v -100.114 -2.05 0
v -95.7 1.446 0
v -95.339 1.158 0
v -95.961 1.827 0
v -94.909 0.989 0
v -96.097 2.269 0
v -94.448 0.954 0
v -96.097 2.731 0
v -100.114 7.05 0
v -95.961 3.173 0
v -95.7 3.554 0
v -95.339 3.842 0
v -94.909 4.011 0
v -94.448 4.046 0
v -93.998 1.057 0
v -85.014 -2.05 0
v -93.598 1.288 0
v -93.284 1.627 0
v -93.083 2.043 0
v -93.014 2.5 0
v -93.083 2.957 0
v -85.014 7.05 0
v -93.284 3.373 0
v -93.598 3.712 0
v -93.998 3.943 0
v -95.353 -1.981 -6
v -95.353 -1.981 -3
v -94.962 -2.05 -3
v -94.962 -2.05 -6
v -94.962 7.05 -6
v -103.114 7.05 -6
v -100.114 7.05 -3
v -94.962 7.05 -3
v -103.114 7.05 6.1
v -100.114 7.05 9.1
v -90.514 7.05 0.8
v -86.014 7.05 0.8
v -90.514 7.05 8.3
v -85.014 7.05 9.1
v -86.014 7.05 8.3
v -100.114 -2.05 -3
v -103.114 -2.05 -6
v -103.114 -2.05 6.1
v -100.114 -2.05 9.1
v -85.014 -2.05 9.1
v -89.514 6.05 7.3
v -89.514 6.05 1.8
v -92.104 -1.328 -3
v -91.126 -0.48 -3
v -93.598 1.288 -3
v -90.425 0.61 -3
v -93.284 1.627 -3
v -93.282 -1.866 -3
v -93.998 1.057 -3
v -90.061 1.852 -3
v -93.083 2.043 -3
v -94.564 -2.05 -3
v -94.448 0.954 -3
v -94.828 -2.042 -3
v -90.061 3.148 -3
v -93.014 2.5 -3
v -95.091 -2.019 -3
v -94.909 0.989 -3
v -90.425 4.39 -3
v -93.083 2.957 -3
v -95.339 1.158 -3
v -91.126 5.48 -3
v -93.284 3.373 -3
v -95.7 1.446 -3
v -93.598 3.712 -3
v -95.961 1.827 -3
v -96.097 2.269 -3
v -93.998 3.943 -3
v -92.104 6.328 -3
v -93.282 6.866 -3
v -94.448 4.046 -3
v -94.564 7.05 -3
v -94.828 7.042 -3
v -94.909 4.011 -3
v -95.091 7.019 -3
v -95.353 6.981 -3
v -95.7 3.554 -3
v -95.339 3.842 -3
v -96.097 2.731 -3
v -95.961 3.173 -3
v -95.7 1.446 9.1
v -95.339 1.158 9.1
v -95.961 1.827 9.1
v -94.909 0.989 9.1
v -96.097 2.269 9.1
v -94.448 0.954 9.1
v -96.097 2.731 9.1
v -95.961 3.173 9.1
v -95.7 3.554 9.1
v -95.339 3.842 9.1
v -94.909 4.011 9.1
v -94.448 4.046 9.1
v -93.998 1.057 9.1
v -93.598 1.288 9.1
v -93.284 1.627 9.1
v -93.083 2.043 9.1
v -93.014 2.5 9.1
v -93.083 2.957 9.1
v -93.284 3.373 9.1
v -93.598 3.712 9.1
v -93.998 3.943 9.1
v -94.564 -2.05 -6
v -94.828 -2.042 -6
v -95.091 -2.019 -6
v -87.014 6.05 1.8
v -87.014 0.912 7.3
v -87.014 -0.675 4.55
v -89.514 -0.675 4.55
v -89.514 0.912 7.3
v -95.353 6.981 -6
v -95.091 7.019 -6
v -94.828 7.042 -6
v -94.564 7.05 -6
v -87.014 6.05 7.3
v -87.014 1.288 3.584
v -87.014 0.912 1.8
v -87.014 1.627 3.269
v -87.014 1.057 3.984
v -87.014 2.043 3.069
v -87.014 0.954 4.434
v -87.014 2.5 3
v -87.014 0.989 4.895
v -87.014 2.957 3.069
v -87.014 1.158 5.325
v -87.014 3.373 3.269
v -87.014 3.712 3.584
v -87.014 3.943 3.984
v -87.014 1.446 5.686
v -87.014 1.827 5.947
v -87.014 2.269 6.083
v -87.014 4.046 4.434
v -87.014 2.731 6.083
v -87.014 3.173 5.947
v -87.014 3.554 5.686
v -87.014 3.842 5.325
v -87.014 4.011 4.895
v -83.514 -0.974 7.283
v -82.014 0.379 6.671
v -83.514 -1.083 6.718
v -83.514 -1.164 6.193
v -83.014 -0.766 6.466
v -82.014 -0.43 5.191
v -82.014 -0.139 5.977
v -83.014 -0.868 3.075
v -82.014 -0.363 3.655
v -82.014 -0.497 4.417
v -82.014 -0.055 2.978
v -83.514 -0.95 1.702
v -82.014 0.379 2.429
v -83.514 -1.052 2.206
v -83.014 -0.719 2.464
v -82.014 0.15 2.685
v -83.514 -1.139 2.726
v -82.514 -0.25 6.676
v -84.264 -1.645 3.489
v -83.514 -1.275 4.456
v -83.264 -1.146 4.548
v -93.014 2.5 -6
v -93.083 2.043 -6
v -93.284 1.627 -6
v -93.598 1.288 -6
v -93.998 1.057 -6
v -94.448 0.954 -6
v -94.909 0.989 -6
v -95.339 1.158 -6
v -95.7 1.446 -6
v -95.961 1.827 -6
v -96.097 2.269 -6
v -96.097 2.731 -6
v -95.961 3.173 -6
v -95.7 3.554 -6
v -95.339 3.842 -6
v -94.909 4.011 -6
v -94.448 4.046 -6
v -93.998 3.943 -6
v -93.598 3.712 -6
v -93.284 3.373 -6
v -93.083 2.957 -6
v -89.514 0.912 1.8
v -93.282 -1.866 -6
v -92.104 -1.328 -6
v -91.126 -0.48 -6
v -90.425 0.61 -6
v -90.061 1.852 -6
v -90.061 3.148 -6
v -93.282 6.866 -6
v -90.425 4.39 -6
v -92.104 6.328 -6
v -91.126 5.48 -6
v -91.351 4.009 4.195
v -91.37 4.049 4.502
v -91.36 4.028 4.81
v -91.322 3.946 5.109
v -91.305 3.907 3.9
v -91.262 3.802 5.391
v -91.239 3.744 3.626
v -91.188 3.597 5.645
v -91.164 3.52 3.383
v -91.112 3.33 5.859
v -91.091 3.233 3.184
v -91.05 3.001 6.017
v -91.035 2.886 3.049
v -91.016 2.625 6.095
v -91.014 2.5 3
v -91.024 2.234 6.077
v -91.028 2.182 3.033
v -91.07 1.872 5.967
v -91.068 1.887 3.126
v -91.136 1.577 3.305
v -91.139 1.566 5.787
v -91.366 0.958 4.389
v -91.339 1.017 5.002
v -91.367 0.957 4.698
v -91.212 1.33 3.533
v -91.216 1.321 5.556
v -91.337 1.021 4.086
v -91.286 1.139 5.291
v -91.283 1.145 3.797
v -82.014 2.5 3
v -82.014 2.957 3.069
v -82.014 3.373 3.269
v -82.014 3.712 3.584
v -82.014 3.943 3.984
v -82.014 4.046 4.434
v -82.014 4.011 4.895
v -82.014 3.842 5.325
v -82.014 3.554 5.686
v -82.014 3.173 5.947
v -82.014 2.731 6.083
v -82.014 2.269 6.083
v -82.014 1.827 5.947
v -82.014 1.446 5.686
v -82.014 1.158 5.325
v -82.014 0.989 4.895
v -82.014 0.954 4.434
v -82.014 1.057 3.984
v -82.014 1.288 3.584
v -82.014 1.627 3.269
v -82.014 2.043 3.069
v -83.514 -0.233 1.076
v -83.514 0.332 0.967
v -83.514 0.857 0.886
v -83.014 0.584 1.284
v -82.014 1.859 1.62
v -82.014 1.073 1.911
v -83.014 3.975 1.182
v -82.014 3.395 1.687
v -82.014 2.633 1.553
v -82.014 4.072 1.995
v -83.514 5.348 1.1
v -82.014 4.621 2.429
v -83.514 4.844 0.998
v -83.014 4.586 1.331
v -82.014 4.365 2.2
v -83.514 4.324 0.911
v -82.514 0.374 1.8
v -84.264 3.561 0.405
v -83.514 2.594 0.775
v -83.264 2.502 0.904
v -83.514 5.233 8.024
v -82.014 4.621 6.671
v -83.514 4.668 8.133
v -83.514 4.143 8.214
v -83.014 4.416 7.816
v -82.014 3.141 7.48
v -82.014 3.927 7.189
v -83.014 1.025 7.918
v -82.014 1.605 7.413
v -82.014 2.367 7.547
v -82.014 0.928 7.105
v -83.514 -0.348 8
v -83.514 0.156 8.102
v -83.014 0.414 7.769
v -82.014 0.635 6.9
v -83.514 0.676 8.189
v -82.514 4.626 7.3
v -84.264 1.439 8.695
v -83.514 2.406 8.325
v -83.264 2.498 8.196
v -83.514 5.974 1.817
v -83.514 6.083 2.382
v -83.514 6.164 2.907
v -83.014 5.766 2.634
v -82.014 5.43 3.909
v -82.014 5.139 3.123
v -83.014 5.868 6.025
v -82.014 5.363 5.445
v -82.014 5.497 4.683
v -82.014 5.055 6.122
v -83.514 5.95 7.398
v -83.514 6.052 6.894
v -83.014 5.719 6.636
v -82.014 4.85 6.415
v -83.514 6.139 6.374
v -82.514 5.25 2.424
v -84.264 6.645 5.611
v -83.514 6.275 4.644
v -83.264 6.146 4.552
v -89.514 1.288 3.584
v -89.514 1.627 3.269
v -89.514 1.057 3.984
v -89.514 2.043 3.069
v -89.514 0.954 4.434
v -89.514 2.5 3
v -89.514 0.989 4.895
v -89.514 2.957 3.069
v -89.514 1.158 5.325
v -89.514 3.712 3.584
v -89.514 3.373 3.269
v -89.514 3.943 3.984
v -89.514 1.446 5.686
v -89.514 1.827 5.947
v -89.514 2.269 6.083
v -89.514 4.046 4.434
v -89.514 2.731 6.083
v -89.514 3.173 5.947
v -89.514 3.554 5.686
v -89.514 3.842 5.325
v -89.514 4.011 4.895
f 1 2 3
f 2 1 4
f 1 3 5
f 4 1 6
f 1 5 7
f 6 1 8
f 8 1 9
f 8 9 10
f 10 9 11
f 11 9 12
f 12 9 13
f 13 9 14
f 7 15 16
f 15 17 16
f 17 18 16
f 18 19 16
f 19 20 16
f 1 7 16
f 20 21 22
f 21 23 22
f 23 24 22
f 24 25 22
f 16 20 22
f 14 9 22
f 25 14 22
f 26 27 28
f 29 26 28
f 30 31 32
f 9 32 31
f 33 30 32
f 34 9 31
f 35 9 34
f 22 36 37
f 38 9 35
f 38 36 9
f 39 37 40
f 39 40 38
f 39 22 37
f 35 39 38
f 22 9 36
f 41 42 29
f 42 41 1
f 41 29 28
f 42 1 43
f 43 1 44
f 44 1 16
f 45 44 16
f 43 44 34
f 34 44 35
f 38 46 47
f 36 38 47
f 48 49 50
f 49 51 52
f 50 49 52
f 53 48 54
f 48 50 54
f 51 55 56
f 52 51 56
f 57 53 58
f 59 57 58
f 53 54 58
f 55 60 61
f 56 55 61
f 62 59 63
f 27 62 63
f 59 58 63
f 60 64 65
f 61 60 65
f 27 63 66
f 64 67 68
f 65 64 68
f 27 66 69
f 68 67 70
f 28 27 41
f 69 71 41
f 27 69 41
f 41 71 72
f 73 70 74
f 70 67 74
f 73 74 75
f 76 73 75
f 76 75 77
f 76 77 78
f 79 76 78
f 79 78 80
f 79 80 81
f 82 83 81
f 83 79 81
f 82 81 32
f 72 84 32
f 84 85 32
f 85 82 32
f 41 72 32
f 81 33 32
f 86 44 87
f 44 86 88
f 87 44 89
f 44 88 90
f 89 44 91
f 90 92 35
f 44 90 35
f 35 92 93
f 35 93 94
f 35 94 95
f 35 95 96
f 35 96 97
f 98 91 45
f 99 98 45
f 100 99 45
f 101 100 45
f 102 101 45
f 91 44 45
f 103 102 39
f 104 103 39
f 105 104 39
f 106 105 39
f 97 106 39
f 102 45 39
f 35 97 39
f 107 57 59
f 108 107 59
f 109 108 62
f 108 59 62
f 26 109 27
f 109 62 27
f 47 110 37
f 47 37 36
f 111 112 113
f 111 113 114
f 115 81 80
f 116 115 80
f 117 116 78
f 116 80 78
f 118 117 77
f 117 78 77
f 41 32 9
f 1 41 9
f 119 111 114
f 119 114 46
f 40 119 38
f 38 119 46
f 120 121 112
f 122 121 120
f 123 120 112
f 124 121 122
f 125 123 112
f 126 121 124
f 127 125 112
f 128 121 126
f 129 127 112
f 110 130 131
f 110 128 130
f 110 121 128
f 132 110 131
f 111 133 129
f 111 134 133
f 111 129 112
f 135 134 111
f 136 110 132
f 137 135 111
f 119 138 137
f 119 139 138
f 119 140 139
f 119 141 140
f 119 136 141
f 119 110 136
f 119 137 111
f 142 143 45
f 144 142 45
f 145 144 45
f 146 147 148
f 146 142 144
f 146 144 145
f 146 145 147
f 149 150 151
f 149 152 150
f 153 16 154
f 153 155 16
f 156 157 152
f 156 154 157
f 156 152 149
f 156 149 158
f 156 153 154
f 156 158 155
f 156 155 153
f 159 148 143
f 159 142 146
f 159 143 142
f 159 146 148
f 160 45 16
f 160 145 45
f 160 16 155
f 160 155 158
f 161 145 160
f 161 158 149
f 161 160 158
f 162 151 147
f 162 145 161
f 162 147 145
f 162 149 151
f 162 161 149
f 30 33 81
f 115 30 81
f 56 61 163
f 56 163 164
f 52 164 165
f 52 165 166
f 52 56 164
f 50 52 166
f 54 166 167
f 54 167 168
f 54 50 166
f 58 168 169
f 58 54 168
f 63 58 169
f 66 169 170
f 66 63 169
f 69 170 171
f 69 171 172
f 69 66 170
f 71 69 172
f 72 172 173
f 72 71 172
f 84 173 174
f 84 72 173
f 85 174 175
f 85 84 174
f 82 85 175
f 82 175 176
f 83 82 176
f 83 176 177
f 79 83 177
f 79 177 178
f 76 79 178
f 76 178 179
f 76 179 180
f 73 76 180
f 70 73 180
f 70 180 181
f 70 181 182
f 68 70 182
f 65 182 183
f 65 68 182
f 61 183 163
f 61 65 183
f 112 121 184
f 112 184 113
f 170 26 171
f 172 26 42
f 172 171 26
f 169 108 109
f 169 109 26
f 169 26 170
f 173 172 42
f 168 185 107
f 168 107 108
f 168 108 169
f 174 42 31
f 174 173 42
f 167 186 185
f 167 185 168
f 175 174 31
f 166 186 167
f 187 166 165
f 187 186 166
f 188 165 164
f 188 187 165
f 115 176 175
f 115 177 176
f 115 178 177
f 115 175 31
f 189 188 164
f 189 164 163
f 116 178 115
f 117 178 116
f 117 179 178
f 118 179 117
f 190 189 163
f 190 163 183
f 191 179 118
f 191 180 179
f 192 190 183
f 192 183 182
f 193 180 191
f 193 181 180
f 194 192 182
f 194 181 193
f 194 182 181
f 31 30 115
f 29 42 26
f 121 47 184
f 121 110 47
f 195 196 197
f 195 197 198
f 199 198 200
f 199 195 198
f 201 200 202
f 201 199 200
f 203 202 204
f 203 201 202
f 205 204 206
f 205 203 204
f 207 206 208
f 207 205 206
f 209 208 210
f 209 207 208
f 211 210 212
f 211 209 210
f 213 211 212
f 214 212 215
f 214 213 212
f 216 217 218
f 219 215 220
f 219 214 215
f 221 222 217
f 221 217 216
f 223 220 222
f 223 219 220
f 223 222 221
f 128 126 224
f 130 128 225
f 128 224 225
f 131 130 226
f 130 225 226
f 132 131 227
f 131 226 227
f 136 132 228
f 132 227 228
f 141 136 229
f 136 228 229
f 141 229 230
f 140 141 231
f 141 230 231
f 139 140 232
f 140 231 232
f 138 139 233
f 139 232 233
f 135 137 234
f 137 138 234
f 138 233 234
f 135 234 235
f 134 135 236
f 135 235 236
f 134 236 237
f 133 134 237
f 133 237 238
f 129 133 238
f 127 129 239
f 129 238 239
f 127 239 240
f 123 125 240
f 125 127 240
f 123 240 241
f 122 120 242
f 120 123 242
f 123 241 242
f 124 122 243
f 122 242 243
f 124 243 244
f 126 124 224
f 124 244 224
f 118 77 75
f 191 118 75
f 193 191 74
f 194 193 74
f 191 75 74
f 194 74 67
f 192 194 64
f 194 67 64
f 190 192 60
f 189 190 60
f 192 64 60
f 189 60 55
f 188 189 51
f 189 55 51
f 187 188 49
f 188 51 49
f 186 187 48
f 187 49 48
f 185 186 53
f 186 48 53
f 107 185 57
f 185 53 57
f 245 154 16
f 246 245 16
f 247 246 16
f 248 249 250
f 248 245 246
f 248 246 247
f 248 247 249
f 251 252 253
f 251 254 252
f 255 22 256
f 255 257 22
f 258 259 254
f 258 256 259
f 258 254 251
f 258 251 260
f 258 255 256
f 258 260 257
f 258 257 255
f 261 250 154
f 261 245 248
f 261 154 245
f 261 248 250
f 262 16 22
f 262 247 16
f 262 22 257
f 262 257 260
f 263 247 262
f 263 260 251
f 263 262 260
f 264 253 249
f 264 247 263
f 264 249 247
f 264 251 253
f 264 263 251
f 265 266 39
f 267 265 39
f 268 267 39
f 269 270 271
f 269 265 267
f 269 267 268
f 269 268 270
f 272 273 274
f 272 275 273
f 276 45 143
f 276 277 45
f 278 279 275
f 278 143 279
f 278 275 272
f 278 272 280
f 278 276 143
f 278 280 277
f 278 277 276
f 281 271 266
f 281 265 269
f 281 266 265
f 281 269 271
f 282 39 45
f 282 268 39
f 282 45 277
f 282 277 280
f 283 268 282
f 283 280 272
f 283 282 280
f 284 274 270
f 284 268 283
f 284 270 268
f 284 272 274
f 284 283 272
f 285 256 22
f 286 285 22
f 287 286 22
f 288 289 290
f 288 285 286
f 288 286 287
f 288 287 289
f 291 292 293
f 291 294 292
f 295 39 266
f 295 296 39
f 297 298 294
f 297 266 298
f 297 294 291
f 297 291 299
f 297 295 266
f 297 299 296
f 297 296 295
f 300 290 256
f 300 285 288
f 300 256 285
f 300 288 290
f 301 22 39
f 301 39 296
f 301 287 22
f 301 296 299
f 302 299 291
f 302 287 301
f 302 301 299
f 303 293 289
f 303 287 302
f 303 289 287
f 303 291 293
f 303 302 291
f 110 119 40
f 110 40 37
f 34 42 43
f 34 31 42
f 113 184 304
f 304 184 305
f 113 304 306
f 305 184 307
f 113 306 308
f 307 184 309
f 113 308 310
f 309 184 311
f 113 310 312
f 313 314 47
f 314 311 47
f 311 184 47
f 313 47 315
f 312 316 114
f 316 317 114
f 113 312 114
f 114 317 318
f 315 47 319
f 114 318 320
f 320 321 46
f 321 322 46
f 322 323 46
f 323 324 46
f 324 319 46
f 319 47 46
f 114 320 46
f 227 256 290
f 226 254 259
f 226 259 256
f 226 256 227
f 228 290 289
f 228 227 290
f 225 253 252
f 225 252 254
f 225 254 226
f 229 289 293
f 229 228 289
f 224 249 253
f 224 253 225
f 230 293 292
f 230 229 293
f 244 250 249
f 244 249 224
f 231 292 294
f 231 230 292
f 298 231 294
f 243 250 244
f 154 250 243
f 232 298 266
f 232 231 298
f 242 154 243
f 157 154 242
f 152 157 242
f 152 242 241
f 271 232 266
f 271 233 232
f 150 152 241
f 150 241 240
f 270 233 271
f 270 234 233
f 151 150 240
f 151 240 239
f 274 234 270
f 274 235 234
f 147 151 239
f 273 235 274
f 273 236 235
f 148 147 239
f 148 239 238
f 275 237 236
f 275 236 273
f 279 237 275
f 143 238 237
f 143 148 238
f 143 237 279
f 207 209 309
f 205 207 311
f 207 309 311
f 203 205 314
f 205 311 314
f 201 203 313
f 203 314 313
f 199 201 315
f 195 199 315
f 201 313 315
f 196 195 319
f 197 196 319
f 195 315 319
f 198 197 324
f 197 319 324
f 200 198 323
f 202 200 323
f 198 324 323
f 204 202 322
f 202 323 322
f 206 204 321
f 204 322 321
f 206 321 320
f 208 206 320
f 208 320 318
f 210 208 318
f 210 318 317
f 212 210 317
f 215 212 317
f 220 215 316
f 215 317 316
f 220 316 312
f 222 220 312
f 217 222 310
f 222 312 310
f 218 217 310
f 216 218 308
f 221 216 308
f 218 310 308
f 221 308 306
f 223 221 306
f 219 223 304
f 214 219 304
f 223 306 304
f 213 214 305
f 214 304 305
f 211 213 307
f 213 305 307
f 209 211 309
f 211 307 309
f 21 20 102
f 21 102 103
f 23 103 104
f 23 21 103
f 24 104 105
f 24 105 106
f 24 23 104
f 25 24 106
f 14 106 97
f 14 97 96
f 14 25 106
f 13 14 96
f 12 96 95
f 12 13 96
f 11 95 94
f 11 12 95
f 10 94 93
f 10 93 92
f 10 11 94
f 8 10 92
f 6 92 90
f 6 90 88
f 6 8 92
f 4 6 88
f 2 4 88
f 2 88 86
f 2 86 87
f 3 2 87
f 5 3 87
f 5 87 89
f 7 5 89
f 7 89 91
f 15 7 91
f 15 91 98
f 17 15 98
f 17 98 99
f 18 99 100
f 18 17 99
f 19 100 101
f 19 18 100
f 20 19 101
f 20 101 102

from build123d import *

# Parameters (mm, degrees)
SKETCH1_R               = 4.55
SKETCH1_R_2             = 1.55
BOSS_EXTRUDE1_DEPTH     = 9.1
SKETCH2_R               = 1.55
BOSS_EXTRUDE2_DEPTH     = 3
SKETCH3_W               = 15.1
SKETCH3_H               = 9.1
BOSS_EXTRUDE3_DEPTH     = 3
CUT_EXTRUDE1_REACH      = 26.036
CUT_EXTRUDE1_END_RADIUS = 3.55
SKETCH4_R               = 1.55
SKETCH5_R               = 1.55
CUT_EXTRUDE2_DEPTH      = 2.5
CHAMFER1_SIZE           = 1
CHAMFER2_SIZE           = 3


with BuildPart() as part:
    # Sketch1 → Boss-Extrude1 (new body)
    # profile 1 of 3: a face of its own
    with BuildSketch(Plane.XY):
        with Locations((-94.564189657, 2.5)):
            Circle(SKETCH1_R)
        with Locations((-94.564189657, 2.5)):
            Circle(SKETCH1_R_2, mode=Mode.SUBTRACT)
    # profile 2 of 3: a face of its own
    with BuildSketch(Plane.XY):
        with BuildLine():
            ThreePointArc((-94.564189657, -2.05), (-99.114189657, 2.5), (-94.564189657, 7.05))
            Line((-94.564189657, 7.05), (-100.114189657, 7.05))
            Line((-100.114189657, 7.05), (-100.114189657, -2.05))
            Line((-100.114189657, -2.05), (-94.564189657, -2.05))
        make_face()
    # profile 3 of 3: a face of its own
    with BuildSketch(Plane.XY):
        with BuildLine():
            Line((-85.014189657, 7.05), (-94.564189657, 7.05))
            ThreePointArc((-94.564189657, 7.05), (-91.346853802, 5.717335854), (-90.014189657, 2.5))
            ThreePointArc((-90.014189657, 2.5), (-91.346853802, -0.717335854), (-94.564189657, -2.05))
            Line((-94.564189657, -2.05), (-85.014189657, -2.05))
            Line((-85.014189657, -2.05), (-85.014189657, 7.05))
        make_face()
    extrude(amount=BOSS_EXTRUDE1_DEPTH)



with BuildPart() as body_2:
    # Sketch2 → Boss-Extrude2 (new body)
    # profile 1 of 2: a face of its own
    with BuildSketch(Plane(origin=(0, 0, -3), x_dir=(-1, 0, 0), z_dir=(0, 0, -1))):
        with BuildLine():
            ThreePointArc((95.352918097, 6.981116764), (94.960054991, 7.032746478), (94.564189657, 7.05))
            ThreePointArc((94.564189657, 7.05), (90.014189657, 2.5), (94.564189657, -2.05))
            ThreePointArc((94.564189657, -2.05), (94.960054991, -2.032746478), (95.352918097, -1.981116763))
            ThreePointArc((95.352918097, -1.981116763), (98.049244492, -0.42521671), (99.114189657, 2.5))
            ThreePointArc((99.114189657, 2.5), (98.049244492, 5.42521671), (95.352918097, 6.981116764))
        make_face()
        with Locations(Location((94.564189657, 2.5, 0), (0, 0, 180))):
            Circle(SKETCH2_R, mode=Mode.SUBTRACT)
    # profile 2 of 2: a face of its own
    with BuildSketch(Plane(origin=(0, 0, -3), x_dir=(-1, 0, 0), z_dir=(0, 0, -1))):
        with BuildLine():
            Line((100.114189657, -2.05), (100.114189657, 7.05))
            Line((100.114189657, 7.05), (94.96156182, 7.05))
            Line((94.96156182, 7.05), (95.352918097, 6.981116764))
            ThreePointArc((95.352918097, 6.981116764), (98.049244492, 5.42521671), (99.114189657, 2.5))
            ThreePointArc((99.114189657, 2.5), (98.049244492, -0.42521671), (95.352918097, -1.981116763))
            Line((95.352918097, -1.981116763), (94.96156182, -2.05))
            Line((94.96156182, -2.05), (100.114189657, -2.05))
        make_face()
    extrude(amount=BOSS_EXTRUDE2_DEPTH)


with BuildPart() as part_1:
    add(part.part)

    add(body_2.part)  # Boss-Extrude3 merges body 2
    # Sketch3 → Boss-Extrude3 (add)
    with BuildSketch(Plane.ZY.offset(100.114189657)):
        with Locations((1.55, 2.5)):
            Rectangle(SKETCH3_W, SKETCH3_H)
    extrude(amount=BOSS_EXTRUDE3_DEPTH)

    # Loft1: read off the stored shape, not the designer's step
    # Loft1: loft between two sections, ruled curve by curve
    loft1_from = [
        Edge.make_bspline([(-85.014189657, -2.05, 9.1), (-85.014189657, -2.05, 8.341666667), (-85.014189657, -2.05, 7.583333333), (-85.014189657, -2.05, 6.066666667), (-85.014189657, -2.05, 5.308333333), (-85.014189657, -2.05, 3.791666667), (-85.014189657, -2.05, 3.033333333), (-85.014189657, -2.05, 1.516666667), (-85.014189657, -2.05, 0.758333333), (-85.014189657, -2.05, 0)], [0, 0, 0, 0, 0.25, 0.25, 0.5, 0.5, 0.75, 0.75, 1, 1, 1, 1], 3),
        Edge.make_bspline([(-85.014189657, -2.05, 0), (-85.014189657, -1.291666667, 0), (-85.014189657, -0.533333333, 0), (-85.014189657, 0.983333333, 0), (-85.014189657, 1.741666667, 0), (-85.014189657, 3.258333333, 0), (-85.014189657, 4.016666667, 0), (-85.014189657, 5.533333333, 0), (-85.014189657, 6.291666667, 0), (-85.014189657, 7.05, 0)], [0, 0, 0, 0, 0.25, 0.25, 0.5, 0.5, 0.75, 0.75, 1, 1, 1, 1], 3),
        Edge.make_bspline([(-85.014189657, 7.05, 9.1), (-85.014189657, 6.291666667, 9.1), (-85.014189657, 5.533333333, 9.1), (-85.014189657, 4.016666667, 9.1), (-85.014189657, 3.258333333, 9.1), (-85.014189657, 1.741666667, 9.1), (-85.014189657, 0.983333333, 9.1), (-85.014189657, -0.533333333, 9.1), (-85.014189657, -1.291666667, 9.1), (-85.014189657, -2.05, 9.1)], [0, 0, 0, 0, 0.25, 0.25, 0.5, 0.5, 0.75, 0.75, 1, 1, 1, 1], 3),
        Edge.make_bspline([(-85.014189657, 7.05, 0), (-85.014189657, 7.05, 0.758333333), (-85.014189657, 7.05, 1.516666667), (-85.014189657, 7.05, 3.033333333), (-85.014189657, 7.05, 3.791666667), (-85.014189657, 7.05, 5.308333333), (-85.014189657, 7.05, 6.066666667), (-85.014189657, 7.05, 7.583333333), (-85.014189657, 7.05, 8.341666667), (-85.014189657, 7.05, 9.1)], [0, 0, 0, 0, 0.25, 0.25, 0.5, 0.5, 0.75, 0.75, 1, 1, 1, 1], 3),
    ]
    loft1_to = [
        Edge.make_bspline([(-82.014189657, 0.378679656, 6.671320344), (-82.014189657, 0.128679656, 6.421320344), (-82.014189657, -0.095475789, 6.106038327), (-82.014189657, -0.410975479, 5.377025758), (-82.014189657, -0.5, 4.964213562), (-82.014189657, -0.5, 4.135786438), (-82.014189657, -0.410975479, 3.722974242), (-82.014189657, -0.095475789, 2.993961673), (-82.014189657, 0.128679656, 2.678679656), (-82.014189657, 0.378679656, 2.428679656)], [0, 0, 0, 0, 0.25, 0.25, 0.5, 0.5, 0.75, 0.75, 1, 1, 1, 1], 3),
        Edge.make_bspline([(-82.014189657, 0.378679656, 2.428679656), (-82.014189657, 0.628679656, 2.178679656), (-82.014189657, 0.943961673, 1.954524211), (-82.014189657, 1.672974242, 1.639024521), (-82.014189657, 2.085786438, 1.55), (-82.014189657, 2.914213562, 1.55), (-82.014189657, 3.327025758, 1.639024521), (-82.014189657, 4.056038327, 1.954524211), (-82.014189657, 4.371320344, 2.178679656), (-82.014189657, 4.621320344, 2.428679656)], [0, 0, 0, 0, 0.25, 0.25, 0.5, 0.5, 0.75, 0.75, 1, 1, 1, 1], 3),
        Edge.make_bspline([(-82.014189657, 4.621320344, 6.671320344), (-82.014189657, 4.371320344, 6.921320344), (-82.014189657, 4.056038327, 7.145475789), (-82.014189657, 3.327025758, 7.460975479), (-82.014189657, 2.914213562, 7.55), (-82.014189657, 2.085786438, 7.55), (-82.014189657, 1.672974242, 7.460975479), (-82.014189657, 0.943961673, 7.145475789), (-82.014189657, 0.628679656, 6.921320344), (-82.014189657, 0.378679656, 6.671320344)], [0, 0, 0, 0, 0.25, 0.25, 0.5, 0.5, 0.75, 0.75, 1, 1, 1, 1], 3),
        Edge.make_bspline([(-82.014189657, 4.621320344, 2.428679656), (-82.014189657, 4.871320344, 2.678679656), (-82.014189657, 5.095475789, 2.993961673), (-82.014189657, 5.410975479, 3.722974242), (-82.014189657, 5.5, 4.135786438), (-82.014189657, 5.5, 4.964213562), (-82.014189657, 5.410975479, 5.377025758), (-82.014189657, 5.095475789, 6.106038327), (-82.014189657, 4.871320344, 6.421320344), (-82.014189657, 4.621320344, 6.671320344)], [0, 0, 0, 0, 0.25, 0.25, 0.5, 0.5, 0.75, 0.75, 1, 1, 1, 1], 3),
    ]
    loft1 = Solid(Shell([*[Face.make_surface_from_curves(loft1_from[k], loft1_to[k]) for k in range(4)], Face(Wire(loft1_from)), Face(Wire(loft1_to))]))
    add(loft1)

    # Cut-Extrude1: up to this cylinder (the profile starts outside it)
    cut_extrude1_end = Plane(origin=(-94.564189657, 2.5, 4.55), z_dir=(0, 0, -1)) * Cylinder(CUT_EXTRUDE1_END_RADIUS, 60.172, mode=Mode.PRIVATE)
    # Sketch4 → Cut-Extrude1 (cut, up to the surface)
    with BuildSketch(Plane(origin=(-82.014189657, 0, 0), x_dir=(0, 0, -1), z_dir=(1, 0, 0)), mode=Mode.PRIVATE) as cut_extrude1_sk1:
        with Locations((-4.55, 2.5)):
            Circle(SKETCH4_R)
    cut_extrude1_tool1 = extrude(cut_extrude1_sk1.sketch, amount=-CUT_EXTRUDE1_REACH, mode=Mode.PRIVATE) - cut_extrude1_end
    add(cut_extrude1_tool1.solids().sort_by_distance((-82.01419, 2.5, 4.55))[0], mode=Mode.SUBTRACT)

    # Sketch5 → Cut-Extrude2 (cut)
    # profile 1 of 2: a face of its own
    with BuildSketch(Plane.ZY.offset(87.014189657)):
        Polygon((4.55, 5.675426481), (7.3, 4.08771324), (7.3, 7.05), (1.8, 7.05), (1.8, 4.08771324), align=None)
    # profile 2 of 2: a face of its own
    with BuildSketch(Plane.ZY.offset(87.014189657)):
        Polygon((7.3, 0.91228676), (7.3, 4.08771324), (4.55, 5.675426481), (1.8, 4.08771324), (1.8, 0.91228676), (4.55, -0.675426481), align=None)
        with Locations(Location((4.55, 2.5, 0), (0, 0, 180))):
            Circle(SKETCH5_R, mode=Mode.SUBTRACT)
    extrude(amount=CUT_EXTRUDE2_DEPTH, mode=Mode.SUBTRACT)

    # Chamfer1
    chamfer1_edges = [part_1.edges().sort_by_distance(p)[0] for p in [
        (-87.014189657, 7.05, 4.55),
        (-88.264189657, 7.05, 7.3),
        (-88.264189657, 7.05, 1.8),
        (-89.514189657, 7.05, 4.55),
    ]]
    chamfer(chamfer1_edges, length=CHAMFER1_SIZE)

    # Chamfer2
    chamfer2_edges = [part_1.edges().sort_by_distance(p)[0] for p in [
        (-103.114189657, 2.5, 9.1),
    ]]
    chamfer(chamfer2_edges, length=CHAMFER2_SIZE)


solid = part_1.part
